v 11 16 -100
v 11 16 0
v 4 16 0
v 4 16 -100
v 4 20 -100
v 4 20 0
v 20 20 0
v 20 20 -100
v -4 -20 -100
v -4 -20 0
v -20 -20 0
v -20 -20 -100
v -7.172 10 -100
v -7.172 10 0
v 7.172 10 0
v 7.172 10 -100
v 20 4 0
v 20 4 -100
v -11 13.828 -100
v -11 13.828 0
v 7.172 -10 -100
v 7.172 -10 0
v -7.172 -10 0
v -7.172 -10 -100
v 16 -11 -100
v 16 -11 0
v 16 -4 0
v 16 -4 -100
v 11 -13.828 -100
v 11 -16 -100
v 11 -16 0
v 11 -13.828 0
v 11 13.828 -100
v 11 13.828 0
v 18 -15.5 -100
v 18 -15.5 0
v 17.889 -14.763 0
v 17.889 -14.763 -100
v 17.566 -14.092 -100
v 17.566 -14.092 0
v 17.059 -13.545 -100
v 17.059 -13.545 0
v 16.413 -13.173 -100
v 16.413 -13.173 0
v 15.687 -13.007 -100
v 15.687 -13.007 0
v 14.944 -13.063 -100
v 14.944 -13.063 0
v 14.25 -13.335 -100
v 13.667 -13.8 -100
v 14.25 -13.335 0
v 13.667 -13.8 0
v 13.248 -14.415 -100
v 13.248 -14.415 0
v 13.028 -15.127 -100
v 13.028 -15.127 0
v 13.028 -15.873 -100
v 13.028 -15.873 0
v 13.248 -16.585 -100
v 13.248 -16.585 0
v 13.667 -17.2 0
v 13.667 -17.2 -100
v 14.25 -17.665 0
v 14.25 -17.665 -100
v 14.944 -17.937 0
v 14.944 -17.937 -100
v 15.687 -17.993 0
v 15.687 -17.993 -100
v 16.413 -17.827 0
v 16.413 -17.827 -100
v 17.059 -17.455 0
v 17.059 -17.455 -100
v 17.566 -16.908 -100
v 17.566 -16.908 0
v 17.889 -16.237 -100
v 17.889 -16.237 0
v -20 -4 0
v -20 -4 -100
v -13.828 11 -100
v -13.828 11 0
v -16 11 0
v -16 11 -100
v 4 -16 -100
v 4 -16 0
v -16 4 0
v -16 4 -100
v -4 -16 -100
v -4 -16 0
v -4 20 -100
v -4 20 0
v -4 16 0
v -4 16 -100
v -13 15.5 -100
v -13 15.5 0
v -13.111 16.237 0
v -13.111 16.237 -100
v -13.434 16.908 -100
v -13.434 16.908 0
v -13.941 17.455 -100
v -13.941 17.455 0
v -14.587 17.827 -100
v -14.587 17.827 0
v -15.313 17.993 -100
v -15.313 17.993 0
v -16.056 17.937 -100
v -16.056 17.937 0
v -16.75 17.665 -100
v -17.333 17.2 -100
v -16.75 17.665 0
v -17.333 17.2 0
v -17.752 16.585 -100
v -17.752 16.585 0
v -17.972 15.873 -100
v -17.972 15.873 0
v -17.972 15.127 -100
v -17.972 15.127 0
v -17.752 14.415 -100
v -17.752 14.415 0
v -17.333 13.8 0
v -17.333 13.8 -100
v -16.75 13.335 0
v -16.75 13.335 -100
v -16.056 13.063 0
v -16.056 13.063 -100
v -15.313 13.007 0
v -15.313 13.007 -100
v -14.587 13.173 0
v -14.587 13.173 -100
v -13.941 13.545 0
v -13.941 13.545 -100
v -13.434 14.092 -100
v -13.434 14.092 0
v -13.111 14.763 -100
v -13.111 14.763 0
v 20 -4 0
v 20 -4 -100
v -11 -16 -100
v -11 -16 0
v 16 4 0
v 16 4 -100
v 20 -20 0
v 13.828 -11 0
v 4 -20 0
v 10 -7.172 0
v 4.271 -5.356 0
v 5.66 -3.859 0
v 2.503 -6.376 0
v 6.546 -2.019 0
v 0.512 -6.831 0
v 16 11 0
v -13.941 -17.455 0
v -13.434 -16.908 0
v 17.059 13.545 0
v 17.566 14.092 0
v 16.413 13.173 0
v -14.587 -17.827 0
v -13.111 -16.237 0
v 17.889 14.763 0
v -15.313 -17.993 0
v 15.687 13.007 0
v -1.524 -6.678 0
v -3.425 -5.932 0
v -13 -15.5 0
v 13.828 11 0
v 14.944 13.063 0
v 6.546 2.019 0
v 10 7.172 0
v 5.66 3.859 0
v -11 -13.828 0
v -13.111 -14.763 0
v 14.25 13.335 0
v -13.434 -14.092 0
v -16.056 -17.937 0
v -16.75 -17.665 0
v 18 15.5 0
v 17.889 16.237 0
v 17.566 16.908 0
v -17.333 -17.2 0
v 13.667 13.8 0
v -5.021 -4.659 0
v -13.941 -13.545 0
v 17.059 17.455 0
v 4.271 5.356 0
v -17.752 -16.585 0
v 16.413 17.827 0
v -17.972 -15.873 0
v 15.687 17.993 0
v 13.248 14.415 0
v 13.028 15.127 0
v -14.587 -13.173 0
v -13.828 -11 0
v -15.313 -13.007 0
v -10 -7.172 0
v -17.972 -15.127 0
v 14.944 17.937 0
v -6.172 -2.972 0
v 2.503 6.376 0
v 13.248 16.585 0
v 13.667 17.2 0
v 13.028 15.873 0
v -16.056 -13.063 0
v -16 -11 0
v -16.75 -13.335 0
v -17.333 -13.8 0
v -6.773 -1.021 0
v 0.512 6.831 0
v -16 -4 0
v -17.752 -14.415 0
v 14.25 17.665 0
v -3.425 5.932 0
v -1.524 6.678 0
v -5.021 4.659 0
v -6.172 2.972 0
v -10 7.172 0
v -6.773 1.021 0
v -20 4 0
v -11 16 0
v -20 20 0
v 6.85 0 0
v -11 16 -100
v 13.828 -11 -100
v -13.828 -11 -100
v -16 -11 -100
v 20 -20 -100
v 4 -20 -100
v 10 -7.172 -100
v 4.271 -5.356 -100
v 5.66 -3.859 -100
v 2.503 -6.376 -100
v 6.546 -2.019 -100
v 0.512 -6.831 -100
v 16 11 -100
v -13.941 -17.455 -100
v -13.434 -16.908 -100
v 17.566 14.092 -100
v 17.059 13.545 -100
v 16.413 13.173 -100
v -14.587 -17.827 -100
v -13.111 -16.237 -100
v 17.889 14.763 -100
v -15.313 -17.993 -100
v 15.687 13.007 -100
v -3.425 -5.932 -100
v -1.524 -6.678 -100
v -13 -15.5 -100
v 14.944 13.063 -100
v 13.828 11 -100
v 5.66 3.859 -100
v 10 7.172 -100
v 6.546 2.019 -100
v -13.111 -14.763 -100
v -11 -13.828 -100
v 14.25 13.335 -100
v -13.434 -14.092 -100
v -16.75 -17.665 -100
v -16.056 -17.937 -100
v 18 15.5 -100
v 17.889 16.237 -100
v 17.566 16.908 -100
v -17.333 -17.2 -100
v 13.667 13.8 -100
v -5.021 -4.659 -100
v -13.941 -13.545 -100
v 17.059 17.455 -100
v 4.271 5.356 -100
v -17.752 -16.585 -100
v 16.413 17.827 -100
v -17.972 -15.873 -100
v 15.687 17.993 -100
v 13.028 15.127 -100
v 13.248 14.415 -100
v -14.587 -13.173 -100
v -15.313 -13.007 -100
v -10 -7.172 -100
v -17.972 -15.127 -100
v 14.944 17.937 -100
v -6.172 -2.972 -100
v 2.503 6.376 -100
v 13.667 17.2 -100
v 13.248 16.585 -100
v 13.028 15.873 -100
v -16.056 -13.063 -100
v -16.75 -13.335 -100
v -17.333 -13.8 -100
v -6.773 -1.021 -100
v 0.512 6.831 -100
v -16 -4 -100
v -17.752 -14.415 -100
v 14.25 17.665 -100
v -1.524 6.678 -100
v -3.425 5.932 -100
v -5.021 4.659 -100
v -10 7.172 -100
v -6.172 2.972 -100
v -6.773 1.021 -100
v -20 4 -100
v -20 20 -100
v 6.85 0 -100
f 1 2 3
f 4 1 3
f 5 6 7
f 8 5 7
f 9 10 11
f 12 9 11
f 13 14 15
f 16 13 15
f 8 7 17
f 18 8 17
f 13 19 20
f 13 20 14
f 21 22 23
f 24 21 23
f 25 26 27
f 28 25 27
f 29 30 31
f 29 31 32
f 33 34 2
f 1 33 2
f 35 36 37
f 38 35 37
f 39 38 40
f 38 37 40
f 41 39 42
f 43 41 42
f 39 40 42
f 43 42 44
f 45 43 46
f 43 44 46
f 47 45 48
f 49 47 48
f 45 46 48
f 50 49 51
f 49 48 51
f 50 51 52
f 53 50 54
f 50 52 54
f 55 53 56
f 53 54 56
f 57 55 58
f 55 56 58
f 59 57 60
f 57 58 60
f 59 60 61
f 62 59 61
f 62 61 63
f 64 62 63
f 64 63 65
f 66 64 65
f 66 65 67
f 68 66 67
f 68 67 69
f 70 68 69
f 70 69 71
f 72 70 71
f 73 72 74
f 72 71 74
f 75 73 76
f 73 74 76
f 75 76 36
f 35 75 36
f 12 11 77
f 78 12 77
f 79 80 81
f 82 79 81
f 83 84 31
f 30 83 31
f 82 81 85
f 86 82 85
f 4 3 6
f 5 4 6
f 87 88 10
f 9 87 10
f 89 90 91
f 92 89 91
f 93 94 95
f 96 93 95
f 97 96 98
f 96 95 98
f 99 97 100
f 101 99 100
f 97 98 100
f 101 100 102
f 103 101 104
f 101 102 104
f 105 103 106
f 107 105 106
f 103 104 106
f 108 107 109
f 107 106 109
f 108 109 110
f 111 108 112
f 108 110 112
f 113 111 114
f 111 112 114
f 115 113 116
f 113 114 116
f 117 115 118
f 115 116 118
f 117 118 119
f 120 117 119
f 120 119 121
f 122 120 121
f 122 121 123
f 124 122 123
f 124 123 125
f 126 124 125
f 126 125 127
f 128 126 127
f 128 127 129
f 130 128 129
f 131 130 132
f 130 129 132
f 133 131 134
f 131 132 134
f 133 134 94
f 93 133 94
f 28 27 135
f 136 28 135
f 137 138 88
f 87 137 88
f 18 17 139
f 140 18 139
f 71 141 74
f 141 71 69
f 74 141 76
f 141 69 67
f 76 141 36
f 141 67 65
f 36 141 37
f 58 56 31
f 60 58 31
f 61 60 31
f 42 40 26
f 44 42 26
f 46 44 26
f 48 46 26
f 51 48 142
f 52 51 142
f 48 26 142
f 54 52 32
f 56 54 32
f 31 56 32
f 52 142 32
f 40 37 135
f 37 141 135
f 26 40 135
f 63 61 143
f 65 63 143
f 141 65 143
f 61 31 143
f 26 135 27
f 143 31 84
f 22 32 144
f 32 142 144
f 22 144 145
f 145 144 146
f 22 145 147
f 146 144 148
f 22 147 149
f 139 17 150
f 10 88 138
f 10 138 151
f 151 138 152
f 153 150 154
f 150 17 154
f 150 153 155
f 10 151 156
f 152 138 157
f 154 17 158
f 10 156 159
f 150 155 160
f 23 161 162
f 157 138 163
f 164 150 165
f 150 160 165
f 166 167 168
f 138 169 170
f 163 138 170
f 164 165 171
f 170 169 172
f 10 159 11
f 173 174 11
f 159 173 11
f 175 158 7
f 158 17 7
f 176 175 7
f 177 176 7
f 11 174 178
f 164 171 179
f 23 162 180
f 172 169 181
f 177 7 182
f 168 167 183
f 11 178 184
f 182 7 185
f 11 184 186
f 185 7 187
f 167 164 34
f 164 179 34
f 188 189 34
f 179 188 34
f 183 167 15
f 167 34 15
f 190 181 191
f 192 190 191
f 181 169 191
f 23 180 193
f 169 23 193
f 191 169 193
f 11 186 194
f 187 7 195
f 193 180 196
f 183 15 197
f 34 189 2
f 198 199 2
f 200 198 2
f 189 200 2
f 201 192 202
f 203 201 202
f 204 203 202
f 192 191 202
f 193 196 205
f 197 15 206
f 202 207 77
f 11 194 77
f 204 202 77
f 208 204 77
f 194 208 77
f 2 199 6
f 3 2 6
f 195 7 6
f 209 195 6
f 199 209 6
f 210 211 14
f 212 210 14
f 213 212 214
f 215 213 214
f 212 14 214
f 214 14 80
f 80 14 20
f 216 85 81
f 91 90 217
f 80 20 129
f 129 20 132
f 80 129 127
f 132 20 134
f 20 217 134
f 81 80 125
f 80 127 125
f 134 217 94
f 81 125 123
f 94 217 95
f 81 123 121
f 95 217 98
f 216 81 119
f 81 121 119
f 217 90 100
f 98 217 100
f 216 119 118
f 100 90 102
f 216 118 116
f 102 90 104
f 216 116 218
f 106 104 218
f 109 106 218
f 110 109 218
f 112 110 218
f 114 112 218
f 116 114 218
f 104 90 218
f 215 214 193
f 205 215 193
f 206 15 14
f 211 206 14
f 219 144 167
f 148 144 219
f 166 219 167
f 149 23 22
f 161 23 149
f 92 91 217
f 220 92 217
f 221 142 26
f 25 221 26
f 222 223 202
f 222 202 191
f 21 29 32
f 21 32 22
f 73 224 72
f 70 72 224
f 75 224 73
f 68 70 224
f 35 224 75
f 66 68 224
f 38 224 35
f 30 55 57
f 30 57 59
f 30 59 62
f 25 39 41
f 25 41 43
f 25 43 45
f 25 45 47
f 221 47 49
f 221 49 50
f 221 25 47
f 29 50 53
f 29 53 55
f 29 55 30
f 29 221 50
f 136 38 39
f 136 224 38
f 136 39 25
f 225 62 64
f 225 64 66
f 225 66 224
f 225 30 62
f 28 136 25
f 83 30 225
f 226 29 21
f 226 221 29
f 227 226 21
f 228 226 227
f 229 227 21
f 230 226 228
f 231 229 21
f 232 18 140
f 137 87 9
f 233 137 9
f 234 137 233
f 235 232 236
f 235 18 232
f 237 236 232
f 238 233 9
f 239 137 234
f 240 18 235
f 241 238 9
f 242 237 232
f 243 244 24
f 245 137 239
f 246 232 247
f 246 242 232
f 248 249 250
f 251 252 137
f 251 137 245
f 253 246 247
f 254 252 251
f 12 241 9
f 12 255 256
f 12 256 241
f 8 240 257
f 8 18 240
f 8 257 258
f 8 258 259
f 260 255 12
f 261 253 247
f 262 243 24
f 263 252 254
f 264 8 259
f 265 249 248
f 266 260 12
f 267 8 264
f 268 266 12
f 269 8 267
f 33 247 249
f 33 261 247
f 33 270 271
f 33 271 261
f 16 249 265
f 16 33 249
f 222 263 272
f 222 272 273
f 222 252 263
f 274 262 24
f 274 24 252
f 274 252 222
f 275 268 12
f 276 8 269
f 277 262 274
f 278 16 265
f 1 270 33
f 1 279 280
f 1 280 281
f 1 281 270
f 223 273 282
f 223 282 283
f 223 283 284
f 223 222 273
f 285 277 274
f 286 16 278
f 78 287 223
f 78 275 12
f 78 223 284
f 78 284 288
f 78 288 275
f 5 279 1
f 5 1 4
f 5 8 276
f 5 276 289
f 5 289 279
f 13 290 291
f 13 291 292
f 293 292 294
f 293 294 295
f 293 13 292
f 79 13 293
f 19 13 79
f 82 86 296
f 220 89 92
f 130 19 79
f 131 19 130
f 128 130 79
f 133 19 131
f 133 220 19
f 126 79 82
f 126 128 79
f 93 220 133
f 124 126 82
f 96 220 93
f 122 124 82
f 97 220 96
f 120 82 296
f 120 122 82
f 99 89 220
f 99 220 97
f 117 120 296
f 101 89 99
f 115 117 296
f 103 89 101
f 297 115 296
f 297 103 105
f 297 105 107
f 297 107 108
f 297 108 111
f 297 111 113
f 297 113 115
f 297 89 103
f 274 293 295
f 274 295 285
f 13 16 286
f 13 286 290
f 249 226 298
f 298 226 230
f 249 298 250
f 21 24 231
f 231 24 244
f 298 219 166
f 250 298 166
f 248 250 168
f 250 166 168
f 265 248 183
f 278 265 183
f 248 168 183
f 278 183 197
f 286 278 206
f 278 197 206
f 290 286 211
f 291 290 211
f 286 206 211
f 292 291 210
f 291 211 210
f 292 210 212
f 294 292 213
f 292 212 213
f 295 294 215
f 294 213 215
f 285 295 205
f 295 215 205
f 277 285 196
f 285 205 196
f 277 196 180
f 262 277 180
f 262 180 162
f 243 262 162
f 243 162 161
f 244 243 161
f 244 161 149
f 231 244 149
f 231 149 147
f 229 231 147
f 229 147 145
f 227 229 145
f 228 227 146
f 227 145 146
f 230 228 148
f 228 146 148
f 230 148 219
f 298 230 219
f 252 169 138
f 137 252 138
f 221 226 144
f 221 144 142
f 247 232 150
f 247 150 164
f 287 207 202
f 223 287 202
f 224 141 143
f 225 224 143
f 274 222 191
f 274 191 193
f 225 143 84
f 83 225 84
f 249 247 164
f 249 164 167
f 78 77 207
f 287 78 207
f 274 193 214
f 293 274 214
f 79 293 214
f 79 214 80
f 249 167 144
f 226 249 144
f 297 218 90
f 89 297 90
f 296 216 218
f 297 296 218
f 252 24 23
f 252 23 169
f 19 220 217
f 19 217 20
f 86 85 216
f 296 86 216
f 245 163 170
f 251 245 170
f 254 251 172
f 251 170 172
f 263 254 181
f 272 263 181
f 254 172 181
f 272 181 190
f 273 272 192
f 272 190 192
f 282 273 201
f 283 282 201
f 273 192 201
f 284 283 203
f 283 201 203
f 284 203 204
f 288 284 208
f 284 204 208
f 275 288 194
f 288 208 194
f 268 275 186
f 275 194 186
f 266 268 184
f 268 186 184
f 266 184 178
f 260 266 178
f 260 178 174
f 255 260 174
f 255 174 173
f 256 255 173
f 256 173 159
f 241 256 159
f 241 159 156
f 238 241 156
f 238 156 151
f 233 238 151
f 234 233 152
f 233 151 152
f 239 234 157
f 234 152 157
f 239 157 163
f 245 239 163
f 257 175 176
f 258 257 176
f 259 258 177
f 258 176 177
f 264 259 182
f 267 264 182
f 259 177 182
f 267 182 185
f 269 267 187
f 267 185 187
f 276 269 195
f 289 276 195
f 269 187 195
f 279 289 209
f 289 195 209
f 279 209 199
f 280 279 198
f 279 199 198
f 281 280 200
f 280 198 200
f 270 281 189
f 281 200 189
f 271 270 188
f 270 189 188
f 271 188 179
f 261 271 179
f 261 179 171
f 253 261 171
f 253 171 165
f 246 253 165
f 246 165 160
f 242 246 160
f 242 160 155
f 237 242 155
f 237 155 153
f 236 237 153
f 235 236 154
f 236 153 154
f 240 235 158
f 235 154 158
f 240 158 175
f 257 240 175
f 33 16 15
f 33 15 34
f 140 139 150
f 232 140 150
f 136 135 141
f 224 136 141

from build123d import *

# Parameters (mm, degrees)
SKETCH1_R      = 2.5
SKETCH1_R_2    = 6.85
EXTRUDE1_DEPTH = 100


with BuildPart() as part:
    # Sketch1 → Extrude1 (new body)
    with BuildSketch(Plane.XY):
        Polygon((-20, -4), (-16, -4), (-16, -11), (-13.828427, -11), (-10, -7.171573), (-10, 7.171573), (-13.828427, 11), (-16, 11), (-16, 4), (-20, 4), (-20, 20), (-4, 20), (-4, 16), (-11, 16), (-11, 13.828427), (-7.171573, 10), (7.171573, 10), (11, 13.828427), (11, 16), (4, 16), (4, 20), (20, 20), (20, 4), (16, 4), (16, 11), (13.828427, 11), (10, 7.171573), (10, -7.171573), (13.828427, -11), (16, -11), (16, -4), (20, -4), (20, -20), (4, -20), (4, -16), (11, -16), (11, -13.828427), (7.171573, -10), (-7.171573, -10), (-11, -13.828427), (-11, -16), (-4, -16), (-4, -20), (-20, -20), align=None)
        with Locations((-15.5, -15.5)):
            Circle(SKETCH1_R, mode=Mode.SUBTRACT)
        with Locations((-15.5, 15.5)):
            Circle(SKETCH1_R, mode=Mode.SUBTRACT)
        with Locations((15.5, -15.5)):
            Circle(SKETCH1_R, mode=Mode.SUBTRACT)
        with Locations((15.5, 15.5)):
            Circle(SKETCH1_R, mode=Mode.SUBTRACT)
        Circle(SKETCH1_R_2, mode=Mode.SUBTRACT)
    extrude(amount=-EXTRUDE1_DEPTH)


solid = part.part
